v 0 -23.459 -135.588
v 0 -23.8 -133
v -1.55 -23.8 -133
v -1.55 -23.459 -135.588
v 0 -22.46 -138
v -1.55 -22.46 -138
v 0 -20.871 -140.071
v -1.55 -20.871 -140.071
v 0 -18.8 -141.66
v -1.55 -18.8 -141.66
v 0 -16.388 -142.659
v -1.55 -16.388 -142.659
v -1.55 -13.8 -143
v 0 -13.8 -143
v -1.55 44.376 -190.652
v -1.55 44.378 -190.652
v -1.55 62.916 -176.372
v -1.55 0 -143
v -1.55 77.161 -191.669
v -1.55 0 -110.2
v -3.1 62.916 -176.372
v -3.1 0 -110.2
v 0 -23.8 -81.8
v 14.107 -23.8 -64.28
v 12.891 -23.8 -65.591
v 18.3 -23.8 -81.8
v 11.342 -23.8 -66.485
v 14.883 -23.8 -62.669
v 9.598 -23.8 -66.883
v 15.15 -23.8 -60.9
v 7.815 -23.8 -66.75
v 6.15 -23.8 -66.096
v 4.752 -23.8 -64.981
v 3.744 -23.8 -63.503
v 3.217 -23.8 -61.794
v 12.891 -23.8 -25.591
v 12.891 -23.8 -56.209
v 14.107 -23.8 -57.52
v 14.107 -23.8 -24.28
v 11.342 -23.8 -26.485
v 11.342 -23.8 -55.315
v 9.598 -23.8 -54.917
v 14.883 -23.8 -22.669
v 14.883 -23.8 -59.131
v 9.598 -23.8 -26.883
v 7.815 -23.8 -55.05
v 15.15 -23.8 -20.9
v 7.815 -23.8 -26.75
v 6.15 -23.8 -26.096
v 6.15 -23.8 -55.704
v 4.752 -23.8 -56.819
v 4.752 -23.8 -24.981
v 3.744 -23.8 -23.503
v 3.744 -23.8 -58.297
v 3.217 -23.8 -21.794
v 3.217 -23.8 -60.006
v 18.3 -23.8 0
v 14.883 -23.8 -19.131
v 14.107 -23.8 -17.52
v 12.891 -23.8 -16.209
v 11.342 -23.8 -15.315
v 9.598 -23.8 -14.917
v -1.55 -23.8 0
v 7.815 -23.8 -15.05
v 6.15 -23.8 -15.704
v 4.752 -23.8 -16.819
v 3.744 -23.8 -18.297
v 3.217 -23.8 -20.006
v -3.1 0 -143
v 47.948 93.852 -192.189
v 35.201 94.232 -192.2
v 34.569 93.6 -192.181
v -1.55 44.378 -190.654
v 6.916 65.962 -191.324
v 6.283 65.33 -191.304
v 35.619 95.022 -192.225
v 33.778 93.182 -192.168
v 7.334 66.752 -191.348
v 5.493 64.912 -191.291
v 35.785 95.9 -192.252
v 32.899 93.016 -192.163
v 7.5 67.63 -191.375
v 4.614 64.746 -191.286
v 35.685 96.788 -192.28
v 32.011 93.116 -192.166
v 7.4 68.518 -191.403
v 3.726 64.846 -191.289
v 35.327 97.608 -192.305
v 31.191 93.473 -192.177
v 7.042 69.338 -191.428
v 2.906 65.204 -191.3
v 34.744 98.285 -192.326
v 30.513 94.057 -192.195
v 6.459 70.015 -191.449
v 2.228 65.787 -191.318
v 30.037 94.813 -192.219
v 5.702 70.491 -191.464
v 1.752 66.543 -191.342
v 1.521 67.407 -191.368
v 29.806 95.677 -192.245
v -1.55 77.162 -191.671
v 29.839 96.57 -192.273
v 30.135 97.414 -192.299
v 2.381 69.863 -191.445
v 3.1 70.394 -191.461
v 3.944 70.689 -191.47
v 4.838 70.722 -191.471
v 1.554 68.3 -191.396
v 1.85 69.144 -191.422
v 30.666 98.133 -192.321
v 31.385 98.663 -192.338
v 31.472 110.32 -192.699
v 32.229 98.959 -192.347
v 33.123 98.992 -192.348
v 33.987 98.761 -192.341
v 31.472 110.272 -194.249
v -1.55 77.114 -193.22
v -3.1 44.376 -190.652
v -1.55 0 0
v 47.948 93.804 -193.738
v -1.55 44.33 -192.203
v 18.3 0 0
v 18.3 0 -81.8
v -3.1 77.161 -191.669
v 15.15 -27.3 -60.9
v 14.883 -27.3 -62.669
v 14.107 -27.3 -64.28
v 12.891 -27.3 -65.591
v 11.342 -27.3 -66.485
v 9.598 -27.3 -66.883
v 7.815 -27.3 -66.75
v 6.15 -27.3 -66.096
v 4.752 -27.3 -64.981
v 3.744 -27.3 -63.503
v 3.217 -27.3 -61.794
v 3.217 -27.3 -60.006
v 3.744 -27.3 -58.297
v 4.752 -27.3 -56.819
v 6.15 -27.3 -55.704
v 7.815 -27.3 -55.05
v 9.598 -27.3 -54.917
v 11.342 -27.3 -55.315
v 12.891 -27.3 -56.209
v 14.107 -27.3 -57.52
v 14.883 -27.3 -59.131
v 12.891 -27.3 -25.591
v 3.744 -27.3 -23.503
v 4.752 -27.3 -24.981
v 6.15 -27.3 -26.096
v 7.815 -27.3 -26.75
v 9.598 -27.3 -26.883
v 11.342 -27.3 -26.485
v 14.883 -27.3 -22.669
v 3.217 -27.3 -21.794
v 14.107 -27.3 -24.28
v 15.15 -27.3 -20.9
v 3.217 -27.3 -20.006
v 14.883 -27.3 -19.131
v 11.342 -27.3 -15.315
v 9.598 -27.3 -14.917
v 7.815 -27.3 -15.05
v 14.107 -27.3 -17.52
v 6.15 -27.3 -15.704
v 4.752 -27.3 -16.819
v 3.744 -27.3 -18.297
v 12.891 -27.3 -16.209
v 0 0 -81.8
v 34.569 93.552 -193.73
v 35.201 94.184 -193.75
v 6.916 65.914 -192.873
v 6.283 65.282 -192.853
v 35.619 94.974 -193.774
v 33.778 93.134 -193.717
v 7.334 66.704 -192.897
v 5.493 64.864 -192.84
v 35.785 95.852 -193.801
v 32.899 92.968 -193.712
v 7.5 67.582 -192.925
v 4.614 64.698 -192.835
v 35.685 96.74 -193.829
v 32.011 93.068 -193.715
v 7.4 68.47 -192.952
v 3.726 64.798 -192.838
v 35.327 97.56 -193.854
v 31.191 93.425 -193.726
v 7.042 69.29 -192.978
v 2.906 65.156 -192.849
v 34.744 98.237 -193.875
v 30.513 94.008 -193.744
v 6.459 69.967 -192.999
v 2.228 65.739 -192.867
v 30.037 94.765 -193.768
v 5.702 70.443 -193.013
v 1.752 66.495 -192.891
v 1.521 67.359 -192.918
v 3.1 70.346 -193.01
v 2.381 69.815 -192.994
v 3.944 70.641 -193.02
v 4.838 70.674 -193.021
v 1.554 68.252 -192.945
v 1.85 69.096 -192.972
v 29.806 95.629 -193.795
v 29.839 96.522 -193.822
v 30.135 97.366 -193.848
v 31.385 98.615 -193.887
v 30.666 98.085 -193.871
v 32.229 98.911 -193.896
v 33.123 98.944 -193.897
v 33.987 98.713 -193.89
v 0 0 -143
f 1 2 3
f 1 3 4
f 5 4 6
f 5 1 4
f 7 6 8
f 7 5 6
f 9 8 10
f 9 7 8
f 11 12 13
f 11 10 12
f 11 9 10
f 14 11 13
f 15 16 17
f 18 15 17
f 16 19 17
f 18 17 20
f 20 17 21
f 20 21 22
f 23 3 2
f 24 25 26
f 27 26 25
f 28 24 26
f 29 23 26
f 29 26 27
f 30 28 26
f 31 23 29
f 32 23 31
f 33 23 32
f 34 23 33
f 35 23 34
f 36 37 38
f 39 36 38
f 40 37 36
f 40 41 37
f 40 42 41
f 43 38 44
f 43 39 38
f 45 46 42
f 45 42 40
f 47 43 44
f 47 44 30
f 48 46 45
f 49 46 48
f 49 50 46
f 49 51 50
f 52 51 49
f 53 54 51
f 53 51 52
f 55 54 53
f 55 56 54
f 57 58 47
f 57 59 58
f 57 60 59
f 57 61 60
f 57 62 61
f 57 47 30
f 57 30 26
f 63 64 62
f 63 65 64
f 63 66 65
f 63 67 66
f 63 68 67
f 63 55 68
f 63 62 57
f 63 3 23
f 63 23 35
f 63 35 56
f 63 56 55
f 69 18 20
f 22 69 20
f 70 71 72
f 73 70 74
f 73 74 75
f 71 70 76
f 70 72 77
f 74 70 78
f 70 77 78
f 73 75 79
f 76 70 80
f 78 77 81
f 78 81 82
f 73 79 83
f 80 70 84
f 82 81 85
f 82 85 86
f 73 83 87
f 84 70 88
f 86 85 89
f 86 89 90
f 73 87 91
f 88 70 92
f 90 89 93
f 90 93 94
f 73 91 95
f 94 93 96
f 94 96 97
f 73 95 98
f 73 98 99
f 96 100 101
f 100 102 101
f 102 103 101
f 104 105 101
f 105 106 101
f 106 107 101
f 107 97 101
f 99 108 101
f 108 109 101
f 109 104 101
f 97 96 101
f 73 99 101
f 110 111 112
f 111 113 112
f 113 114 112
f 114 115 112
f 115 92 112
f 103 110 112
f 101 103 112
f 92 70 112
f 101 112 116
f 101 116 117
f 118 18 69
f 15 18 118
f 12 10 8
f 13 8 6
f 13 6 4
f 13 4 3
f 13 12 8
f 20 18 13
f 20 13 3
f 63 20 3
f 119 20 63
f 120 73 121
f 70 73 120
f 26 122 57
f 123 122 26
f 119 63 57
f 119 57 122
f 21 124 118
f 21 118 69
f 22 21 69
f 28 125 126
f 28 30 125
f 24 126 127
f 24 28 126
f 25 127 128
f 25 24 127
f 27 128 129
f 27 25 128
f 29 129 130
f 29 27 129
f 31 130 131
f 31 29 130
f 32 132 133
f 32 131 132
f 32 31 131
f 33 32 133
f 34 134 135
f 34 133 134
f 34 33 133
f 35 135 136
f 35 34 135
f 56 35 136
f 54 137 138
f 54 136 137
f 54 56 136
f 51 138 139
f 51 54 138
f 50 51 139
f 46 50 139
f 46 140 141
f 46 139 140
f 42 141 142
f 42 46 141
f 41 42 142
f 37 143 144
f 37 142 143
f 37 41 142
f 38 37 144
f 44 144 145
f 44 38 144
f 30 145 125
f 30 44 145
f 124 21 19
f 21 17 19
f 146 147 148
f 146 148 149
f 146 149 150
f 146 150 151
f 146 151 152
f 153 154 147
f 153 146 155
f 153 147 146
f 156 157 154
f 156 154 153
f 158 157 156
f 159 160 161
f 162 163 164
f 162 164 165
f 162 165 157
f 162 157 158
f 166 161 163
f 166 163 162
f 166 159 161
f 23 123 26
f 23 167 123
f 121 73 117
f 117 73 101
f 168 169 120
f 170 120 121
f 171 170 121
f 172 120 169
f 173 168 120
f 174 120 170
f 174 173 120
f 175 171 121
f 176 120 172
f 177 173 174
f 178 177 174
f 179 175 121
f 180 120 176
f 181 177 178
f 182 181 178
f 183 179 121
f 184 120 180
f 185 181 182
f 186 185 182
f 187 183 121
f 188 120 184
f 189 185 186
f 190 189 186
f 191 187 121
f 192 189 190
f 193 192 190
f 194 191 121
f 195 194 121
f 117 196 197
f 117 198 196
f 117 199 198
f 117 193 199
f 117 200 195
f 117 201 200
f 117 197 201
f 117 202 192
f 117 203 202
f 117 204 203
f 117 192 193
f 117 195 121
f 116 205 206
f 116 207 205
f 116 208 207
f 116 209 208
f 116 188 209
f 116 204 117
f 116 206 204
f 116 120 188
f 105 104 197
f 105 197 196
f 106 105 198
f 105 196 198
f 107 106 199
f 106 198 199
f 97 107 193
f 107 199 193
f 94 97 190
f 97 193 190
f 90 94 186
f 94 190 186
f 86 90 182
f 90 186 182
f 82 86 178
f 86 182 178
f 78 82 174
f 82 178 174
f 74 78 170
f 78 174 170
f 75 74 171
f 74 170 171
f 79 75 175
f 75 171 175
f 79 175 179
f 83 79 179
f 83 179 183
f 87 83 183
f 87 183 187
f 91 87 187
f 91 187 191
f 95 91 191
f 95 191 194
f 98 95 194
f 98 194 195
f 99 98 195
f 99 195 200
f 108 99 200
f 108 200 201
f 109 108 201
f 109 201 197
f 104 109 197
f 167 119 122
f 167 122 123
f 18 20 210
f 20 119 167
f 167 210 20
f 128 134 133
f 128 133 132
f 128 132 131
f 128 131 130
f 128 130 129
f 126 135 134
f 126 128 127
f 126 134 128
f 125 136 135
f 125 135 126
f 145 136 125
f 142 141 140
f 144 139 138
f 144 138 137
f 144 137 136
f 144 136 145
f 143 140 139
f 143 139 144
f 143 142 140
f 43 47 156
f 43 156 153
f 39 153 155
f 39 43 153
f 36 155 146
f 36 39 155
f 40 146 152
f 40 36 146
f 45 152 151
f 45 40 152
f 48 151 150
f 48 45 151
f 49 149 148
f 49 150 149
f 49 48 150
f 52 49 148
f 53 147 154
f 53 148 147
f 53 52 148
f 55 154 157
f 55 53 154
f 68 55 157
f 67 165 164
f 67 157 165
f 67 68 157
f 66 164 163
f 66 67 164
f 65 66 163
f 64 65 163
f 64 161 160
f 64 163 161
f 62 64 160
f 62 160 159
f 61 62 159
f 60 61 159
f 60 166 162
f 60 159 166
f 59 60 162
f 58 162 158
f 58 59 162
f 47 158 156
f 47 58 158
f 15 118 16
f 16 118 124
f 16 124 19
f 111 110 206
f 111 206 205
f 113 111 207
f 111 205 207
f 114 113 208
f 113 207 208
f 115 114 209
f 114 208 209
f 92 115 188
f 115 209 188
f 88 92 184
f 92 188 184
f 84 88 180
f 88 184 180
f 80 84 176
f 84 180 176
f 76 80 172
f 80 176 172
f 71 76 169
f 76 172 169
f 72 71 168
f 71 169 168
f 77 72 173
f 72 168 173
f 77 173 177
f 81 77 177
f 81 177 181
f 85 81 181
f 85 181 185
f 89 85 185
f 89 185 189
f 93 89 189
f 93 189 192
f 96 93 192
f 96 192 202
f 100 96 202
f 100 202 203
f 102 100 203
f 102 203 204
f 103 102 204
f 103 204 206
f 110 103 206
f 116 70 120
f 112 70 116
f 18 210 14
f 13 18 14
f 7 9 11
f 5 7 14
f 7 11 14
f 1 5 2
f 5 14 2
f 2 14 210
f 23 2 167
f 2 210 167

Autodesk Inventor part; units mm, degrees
ref_plane "YZ Plane" through (0, 0, 0) normal (1, 0, 0) x (0, 1, 0)
ref_plane "XZ Plane" through (0, 0, 0) normal (0, 1, 0) x (-1, 0, 0)
ref_plane "XY Plane" through (0, 0, 0) normal (0, 0, 1) x (1, 0, 0)
sketch "Boceto1" plane through (0, 0, 0) normal (1, 0, 0) x (0, 1, 0)
  line L0 (0, 0) -> (-23.8, 0)
  line L1 (-23.8, 0) -> (-23.8, -81.8)
  line L2 (-23.8, -81.8) -> (0, -81.8)
  line L3 (0, -81.8) -> (0, 0)
  dimension "d0" = 23.8
  dimension "d1" = 81.8
extrude "Extrusión1" add sketch "Boceto1" along normal blind 12.5
sketch "Boceto2" plane through (0, 0, 0) normal (-1, 0, 0) x (0, 0, 1)
  line L0 (0, 0) -> (-143, 0)
  line L1 (-143, 0) -> (-143, -13.8)
  line L2 (-133, -23.8) -> (0, -23.8)
  line L3 (0, -23.8) -> (0, 0)
  arc A0 (-143, -13.8) -> (-133, -23.8) centre (-133, -13.8) ccw
  point P0 (-143, -23.8)
  dimension "d4" = 143
  dimension "d5" = 10
extrude "Extrusión2" add sketch "Boceto2" along normal blind 1.55
sketch "Boceto3" plane through (-1.55, 0, 0) normal (-1, 0, 0) x (0, 0, 1)
  line L0 (-81.8, 0) -> (0, 0) projected
  line L1 (-143, 0) -> (-143, -13.8) projected
  line L2 (-143, 0) -> (-110.2, 0)
  line L3 (-81.8, 0) -> (-143, 0) projected
  line L4 (-143, 0) -> (-192.2511, 45.8653)
  arc A0 (-16.2, 0) -> (-135.0604, 90.653) centre (-110.2, 0) ccw
  line L5 (-176.372, 62.9165) -> (-110.2, 0)
  line L6 (-176.372, 62.9165) -> (-193.2664, 78.6495)
  line L7 (-192.2511, 45.8653) -> (-193.2664, 78.6495)
  dimension "d10" = 32.8
  dimension "d15" = 23.3
  dimension "d17" = 32.8
extrude "Extrusión3" add sketch "Boceto3" along normal blind 1.55
sketch "Boceto6" plane through (-1.55, 45.8653, -192.2511) normal (0, -0.031, -0.9995) x (-1, 0, 0)
  circle A0 centre (1.55, 11.2988) radius 152.2645
  point P0 (-1.55, -51.7948)
extrude "Extrusión5" add sketch "Boceto6" against normal blind 1.55
sketch "Boceto7" plane through (-3.1, 57.2067, -191.0516) normal (0, 0.031, 0.9995) x (1, 0, 0)
  line L0 (1.55, -12.8346) -> (1.55, -58.6668) projected
  line L1 (1.55, -12.8346) -> (51.0475, 36.6629)
  line L2 (1.55, -12.8346) -> (71.55, -12.8346) construction
  line L3 (51.0475, 36.6629) -> (34.5719, 53.1385)
  line L4 (1.55, 5.2527) -> (1.55, 19.9654) projected
  line L5 (34.5719, 53.1385) -> (1.55, 19.9654)
  line L6 (1.55, 19.9654) -> (1.55, -12.8346)
  circle A0 centre (-14.9256, -12.8346) radius 218.7609
  point P0 (3.1, -63.0936)
  point P1 (1.55, 5.2527)
  dimension "d29" = 70
  dimension "d30" = 45
  dimension "d31" = 23.3
extrude "Extrusión6" cut sketch "Boceto7" against normal blind 1.55
sketch "Boceto8" plane through (-1.55, 44.3303, -192.2035) normal (0, -0.031, -0.9995) x (-0.7071, 0.7068, -0.0219)
  line L0 (0, 0) -> (0, 70) projected
  line L1 (0, 70) -> (23.3, 70) projected
  line L2 (24.2891, 22.0971) -> (1.096, -1.096) projected
  circle A0 centre (12.25, 20.808) radius 3
  circle A1 centre (12.25, 60.808) radius 3
  point P0 (-36.6345, -34.4425)
  dimension "d36" = 6
  dimension "d38" = 6
extrude "Extrusión7" cut sketch "Boceto8" against normal blind 1.55
sketch "Boceto11" plane through (12.5, 0, 0) normal (1, 0, 0) x (0, 0, -1)
  line L0 (0, -23.8) -> (0, 0) projected
  line L1 (133, -23.8) -> (81.8, -23.8) projected
  line L2 (0, 0) -> (81.8, 0)
  line L3 (81.8, 0) -> (81.8, -23.8)
  line L4 (81.8, -23.8) -> (0, -23.8)
  line L5 (0, -23.8) -> (0, 0)
extrude "Extrusión9" add sketch "Boceto11" along normal blind 5.8
sketch "Boceto13" plane through (0, -23.8, -133) normal (0, -1, 0) x (1, 0, 0)
  line L0 (0, 51.2) -> (18.3, 51.2) projected
  circle A0 centre (9.15, 72.1) radius 6
  circle A1 centre (9.15, 112.1) radius 6
  point P0 (0, 133)
  dimension "d49" = 12
  dimension "d50" = 12
extrude "Extrusión10" add sketch "Boceto13" along normal blind 3.5
properties part number "ventosas"
